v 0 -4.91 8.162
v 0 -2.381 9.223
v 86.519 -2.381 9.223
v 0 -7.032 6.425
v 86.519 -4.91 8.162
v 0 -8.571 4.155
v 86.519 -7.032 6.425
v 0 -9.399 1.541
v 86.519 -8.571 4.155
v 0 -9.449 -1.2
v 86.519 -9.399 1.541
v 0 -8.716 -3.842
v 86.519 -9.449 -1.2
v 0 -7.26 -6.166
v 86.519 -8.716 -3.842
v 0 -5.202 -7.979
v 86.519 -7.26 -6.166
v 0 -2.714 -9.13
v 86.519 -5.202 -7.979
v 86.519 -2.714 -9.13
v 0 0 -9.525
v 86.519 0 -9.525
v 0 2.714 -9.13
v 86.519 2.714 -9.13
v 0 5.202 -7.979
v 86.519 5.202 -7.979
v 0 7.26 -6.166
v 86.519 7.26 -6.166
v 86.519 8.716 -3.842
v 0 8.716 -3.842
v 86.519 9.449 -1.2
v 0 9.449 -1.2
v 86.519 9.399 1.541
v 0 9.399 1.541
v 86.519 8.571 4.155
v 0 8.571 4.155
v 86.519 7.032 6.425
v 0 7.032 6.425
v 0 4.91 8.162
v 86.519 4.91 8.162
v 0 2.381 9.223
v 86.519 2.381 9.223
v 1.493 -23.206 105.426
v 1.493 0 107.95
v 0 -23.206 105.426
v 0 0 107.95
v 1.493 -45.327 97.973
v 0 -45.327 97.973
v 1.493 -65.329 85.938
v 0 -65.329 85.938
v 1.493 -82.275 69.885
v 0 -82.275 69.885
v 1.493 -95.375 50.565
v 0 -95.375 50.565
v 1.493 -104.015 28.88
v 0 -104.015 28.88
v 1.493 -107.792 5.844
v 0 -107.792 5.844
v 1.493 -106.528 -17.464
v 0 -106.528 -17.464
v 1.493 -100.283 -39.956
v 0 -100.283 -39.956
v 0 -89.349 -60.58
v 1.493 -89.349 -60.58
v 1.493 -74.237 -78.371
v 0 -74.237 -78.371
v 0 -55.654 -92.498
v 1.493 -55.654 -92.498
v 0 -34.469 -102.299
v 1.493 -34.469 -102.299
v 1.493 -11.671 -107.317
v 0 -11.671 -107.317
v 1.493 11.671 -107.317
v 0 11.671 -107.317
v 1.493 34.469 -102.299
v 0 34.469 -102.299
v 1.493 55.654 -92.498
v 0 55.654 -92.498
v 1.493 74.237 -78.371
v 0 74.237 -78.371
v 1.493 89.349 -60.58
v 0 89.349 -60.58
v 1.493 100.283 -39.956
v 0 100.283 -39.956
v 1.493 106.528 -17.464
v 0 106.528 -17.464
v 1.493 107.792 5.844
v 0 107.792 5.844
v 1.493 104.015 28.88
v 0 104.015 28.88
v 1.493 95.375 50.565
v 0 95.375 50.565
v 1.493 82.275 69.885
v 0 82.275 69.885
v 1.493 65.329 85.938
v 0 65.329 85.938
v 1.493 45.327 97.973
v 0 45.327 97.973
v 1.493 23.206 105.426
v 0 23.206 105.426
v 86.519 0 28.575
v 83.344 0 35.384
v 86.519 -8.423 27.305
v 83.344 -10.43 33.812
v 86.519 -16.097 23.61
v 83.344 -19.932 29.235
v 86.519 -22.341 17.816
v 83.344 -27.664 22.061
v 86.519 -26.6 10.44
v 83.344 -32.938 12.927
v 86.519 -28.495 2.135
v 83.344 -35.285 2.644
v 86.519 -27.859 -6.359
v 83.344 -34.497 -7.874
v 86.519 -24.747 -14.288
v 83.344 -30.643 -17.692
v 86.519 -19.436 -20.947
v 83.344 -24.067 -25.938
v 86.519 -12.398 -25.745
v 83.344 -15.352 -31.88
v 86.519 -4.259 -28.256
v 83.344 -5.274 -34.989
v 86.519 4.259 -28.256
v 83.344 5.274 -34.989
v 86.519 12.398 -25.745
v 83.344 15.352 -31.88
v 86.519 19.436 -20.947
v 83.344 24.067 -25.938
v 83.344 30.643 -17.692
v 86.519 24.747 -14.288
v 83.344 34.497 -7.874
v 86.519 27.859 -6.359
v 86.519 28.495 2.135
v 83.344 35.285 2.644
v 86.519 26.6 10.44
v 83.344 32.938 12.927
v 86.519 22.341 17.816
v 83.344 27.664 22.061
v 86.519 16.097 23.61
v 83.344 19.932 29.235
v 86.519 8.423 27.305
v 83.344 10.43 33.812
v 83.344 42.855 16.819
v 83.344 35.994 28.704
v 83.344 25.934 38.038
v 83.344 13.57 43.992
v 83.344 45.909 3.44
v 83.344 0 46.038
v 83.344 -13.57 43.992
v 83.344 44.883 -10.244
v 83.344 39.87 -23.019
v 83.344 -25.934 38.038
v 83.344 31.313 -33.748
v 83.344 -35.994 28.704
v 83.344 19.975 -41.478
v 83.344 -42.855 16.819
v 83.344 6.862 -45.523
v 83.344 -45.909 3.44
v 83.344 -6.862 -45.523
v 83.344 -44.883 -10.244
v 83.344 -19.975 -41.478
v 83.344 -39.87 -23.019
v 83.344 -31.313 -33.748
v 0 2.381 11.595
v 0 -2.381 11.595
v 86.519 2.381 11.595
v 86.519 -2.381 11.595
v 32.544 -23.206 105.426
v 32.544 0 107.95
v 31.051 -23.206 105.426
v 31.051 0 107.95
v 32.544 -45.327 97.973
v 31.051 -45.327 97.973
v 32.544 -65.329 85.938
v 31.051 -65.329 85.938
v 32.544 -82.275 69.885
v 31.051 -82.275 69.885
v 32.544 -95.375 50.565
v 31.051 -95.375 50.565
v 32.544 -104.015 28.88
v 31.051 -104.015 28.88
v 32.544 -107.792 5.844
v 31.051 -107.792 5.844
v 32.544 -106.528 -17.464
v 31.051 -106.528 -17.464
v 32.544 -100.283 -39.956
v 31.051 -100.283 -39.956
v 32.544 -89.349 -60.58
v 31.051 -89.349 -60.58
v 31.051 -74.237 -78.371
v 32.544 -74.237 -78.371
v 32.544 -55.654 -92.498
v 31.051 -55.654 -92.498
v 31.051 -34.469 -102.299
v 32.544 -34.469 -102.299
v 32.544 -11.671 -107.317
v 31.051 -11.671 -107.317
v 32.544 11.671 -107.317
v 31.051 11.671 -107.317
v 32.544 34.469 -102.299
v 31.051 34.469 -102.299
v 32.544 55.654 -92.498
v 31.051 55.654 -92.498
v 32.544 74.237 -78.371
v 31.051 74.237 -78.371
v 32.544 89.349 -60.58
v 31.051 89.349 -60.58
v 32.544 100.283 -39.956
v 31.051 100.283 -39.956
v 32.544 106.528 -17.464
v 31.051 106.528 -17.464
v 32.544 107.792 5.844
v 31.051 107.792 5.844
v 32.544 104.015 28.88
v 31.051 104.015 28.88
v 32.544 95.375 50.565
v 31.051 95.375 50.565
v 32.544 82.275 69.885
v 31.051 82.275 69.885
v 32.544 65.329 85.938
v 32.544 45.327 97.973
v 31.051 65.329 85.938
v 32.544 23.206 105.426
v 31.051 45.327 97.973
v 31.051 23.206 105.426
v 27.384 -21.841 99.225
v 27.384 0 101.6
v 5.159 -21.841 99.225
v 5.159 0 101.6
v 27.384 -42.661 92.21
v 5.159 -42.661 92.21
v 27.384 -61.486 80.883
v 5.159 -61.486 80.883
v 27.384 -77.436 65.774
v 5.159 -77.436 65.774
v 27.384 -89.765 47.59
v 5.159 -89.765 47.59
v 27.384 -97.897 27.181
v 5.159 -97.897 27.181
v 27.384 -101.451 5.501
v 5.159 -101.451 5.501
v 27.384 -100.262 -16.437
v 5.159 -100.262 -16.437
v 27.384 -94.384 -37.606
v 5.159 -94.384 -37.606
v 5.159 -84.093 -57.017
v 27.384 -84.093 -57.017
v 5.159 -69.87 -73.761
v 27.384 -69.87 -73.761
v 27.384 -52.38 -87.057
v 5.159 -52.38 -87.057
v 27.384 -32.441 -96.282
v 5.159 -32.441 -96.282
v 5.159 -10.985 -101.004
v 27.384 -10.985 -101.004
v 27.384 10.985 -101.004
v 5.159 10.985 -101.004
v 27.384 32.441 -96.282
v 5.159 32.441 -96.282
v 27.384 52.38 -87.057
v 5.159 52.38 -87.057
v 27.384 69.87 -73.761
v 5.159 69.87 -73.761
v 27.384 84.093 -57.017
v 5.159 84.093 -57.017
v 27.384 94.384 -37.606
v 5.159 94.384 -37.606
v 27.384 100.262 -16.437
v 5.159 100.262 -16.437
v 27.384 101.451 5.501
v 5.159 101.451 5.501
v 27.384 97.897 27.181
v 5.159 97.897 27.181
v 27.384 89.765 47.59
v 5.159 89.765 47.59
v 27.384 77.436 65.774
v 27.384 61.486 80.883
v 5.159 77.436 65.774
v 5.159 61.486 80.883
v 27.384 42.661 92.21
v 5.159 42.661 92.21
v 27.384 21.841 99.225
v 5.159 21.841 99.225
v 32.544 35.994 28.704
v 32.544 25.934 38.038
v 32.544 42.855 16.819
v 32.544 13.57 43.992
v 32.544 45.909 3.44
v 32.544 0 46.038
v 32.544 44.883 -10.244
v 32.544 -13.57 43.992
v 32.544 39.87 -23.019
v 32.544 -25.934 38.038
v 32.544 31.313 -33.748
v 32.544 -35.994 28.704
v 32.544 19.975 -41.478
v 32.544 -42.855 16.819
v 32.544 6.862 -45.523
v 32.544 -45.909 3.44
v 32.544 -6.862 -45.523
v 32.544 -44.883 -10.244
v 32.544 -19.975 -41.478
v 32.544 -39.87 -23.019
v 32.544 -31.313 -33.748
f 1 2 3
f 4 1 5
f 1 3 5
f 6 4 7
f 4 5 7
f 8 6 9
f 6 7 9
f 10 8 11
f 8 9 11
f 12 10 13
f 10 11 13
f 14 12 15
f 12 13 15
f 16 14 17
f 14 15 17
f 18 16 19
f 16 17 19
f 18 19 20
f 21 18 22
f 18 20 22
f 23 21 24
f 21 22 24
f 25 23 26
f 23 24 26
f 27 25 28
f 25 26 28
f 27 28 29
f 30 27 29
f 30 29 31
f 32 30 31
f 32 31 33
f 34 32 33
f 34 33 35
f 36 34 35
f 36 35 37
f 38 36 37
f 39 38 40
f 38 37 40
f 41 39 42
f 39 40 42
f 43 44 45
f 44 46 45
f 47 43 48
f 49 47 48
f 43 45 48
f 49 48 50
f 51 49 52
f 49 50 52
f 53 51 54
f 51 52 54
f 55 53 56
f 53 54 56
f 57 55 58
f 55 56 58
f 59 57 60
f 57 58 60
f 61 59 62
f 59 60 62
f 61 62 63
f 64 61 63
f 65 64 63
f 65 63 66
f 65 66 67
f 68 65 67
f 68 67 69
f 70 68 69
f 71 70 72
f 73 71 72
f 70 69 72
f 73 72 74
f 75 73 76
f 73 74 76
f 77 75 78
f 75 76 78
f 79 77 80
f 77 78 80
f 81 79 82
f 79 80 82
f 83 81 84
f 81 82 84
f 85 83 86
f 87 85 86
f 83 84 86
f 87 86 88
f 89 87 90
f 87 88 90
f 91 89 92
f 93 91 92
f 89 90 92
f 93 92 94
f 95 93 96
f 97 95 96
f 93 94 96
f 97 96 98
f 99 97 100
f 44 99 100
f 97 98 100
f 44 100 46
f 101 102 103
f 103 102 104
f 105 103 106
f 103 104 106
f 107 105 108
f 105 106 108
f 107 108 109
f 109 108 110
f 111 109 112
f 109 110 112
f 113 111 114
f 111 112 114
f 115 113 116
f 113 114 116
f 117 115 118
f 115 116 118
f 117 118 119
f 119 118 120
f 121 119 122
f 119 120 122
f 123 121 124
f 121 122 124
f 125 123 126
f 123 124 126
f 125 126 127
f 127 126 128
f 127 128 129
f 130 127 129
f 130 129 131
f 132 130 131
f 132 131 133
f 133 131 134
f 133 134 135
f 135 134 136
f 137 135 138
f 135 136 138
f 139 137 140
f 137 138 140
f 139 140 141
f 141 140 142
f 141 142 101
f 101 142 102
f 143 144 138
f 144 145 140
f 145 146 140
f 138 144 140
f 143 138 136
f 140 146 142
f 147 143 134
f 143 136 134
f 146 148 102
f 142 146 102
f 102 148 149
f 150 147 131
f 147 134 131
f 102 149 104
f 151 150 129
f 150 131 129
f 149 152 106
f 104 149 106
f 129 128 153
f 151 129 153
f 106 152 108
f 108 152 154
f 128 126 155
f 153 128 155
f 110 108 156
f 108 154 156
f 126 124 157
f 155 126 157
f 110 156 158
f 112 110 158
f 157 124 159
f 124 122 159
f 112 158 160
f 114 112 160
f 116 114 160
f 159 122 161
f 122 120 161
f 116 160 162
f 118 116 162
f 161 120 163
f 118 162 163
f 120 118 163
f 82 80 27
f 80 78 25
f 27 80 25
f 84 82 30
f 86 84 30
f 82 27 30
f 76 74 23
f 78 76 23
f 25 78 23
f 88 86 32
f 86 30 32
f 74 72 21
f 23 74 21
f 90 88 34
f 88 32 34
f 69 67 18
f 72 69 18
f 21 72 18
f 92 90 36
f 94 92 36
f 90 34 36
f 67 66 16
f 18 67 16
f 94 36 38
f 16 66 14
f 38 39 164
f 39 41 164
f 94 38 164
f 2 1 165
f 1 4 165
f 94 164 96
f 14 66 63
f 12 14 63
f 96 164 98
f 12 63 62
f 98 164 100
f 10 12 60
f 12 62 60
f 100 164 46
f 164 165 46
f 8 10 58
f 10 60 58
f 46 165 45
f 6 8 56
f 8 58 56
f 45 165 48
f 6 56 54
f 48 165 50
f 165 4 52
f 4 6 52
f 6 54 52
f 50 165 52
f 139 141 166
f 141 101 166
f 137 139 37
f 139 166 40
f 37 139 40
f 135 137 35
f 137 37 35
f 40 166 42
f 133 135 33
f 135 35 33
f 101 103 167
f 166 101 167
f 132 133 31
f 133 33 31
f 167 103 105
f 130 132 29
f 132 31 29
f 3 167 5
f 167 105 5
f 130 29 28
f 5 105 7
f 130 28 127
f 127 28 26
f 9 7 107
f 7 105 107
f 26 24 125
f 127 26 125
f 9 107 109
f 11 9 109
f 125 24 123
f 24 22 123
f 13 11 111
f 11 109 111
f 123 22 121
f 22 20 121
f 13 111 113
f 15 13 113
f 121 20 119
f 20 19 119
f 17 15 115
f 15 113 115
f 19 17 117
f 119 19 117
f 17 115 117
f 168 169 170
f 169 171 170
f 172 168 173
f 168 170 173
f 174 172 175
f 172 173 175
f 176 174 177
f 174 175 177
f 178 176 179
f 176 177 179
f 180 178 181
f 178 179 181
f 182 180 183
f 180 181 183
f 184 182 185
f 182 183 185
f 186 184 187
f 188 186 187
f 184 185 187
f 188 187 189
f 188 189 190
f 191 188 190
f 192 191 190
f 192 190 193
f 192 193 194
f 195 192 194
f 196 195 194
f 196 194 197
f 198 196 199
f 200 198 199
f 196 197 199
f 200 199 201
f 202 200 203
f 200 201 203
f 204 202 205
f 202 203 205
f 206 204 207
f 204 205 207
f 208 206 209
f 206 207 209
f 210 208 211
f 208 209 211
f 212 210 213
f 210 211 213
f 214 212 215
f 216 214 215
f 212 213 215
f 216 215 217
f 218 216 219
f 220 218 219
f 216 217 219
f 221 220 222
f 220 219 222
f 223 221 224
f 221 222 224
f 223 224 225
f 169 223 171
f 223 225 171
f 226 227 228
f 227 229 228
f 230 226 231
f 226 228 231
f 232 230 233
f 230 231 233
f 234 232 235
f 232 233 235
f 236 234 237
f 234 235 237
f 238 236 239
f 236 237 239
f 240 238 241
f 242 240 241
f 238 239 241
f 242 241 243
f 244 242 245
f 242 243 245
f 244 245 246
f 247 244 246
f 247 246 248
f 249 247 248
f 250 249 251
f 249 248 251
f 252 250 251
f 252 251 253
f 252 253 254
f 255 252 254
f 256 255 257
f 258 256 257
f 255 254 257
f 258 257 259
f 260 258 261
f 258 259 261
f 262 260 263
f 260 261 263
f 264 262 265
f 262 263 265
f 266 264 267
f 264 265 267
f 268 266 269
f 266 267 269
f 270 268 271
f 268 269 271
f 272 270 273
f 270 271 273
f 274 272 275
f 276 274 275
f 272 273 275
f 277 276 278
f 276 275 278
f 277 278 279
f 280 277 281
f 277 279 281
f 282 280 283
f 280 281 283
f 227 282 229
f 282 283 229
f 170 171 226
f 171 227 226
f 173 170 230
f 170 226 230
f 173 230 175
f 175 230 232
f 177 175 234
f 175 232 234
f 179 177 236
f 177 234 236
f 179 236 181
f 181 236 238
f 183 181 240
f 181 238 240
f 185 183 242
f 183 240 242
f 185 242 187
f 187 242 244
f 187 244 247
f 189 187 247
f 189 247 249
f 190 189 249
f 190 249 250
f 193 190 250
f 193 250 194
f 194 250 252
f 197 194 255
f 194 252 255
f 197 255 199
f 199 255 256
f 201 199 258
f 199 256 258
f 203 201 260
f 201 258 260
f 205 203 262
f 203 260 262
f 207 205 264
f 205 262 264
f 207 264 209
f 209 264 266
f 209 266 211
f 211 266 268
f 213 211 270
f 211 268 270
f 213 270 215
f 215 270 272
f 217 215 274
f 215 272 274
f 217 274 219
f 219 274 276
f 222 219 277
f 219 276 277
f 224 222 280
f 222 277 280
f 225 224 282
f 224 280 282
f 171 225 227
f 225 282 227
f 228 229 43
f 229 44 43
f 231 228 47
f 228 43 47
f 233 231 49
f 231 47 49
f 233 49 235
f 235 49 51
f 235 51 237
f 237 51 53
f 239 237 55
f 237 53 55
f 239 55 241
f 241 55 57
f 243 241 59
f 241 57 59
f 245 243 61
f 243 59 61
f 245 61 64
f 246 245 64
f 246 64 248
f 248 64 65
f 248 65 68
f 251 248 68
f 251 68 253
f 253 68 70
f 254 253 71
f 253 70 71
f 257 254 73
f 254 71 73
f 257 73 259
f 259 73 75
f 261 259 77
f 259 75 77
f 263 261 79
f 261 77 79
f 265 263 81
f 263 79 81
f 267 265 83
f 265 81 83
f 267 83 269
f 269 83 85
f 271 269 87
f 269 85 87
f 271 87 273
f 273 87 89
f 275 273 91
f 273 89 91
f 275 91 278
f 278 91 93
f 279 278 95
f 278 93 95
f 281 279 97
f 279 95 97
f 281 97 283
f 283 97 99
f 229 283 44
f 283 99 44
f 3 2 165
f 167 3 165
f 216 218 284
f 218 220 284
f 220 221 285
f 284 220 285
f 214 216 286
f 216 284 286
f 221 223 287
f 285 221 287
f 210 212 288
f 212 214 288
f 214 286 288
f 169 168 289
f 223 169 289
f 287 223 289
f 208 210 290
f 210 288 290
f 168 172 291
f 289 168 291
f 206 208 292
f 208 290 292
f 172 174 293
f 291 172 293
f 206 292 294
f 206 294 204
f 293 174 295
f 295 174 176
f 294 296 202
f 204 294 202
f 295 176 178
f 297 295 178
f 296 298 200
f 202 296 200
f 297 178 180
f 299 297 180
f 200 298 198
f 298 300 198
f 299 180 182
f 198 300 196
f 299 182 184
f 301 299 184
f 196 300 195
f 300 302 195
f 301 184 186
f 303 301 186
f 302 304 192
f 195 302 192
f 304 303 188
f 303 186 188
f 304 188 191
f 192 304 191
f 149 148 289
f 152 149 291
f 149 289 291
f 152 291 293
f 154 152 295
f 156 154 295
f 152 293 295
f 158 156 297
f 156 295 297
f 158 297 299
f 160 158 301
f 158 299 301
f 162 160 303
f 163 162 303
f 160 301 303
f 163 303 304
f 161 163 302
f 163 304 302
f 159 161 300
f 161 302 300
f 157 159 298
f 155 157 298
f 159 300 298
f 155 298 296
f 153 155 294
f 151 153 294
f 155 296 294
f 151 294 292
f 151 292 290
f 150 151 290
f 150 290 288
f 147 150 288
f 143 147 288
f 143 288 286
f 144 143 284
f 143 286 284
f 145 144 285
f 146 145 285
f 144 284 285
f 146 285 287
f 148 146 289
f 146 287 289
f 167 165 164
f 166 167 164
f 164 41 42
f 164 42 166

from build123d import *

# Parameters (mm, degrees)
F2_W     = 4.7625
F2_H     = 4.7625
F3_DEPTH = 86.51975


with BuildPart() as f1:
    # F0 (on Front) → F1 (revolve)
    with BuildSketch(Plane.XZ):
        Polygon((0, 107.95), (0, 9.525), (86.51875, 9.525), (86.51875, 28.575), (83.34375, 35.383809), (83.34375, 46.0375), (32.54375, 46.0375), (32.54375, 107.95), (31.050549, 107.95), (27.384375, 101.6), (5.159375, 101.6), (1.493201, 107.95), align=None)
    revolve(axis=Axis((43.259375, 0, 0), (1, 0, 0)))

    # F2 (on Right) → F3 (cut, through all)
    with BuildSketch(Plane.YZ):
        with Locations((0, 9.21385)):
            Rectangle(F2_W, F2_H)
    extrude(amount=F3_DEPTH, mode=Mode.SUBTRACT)


solid = f1.part
